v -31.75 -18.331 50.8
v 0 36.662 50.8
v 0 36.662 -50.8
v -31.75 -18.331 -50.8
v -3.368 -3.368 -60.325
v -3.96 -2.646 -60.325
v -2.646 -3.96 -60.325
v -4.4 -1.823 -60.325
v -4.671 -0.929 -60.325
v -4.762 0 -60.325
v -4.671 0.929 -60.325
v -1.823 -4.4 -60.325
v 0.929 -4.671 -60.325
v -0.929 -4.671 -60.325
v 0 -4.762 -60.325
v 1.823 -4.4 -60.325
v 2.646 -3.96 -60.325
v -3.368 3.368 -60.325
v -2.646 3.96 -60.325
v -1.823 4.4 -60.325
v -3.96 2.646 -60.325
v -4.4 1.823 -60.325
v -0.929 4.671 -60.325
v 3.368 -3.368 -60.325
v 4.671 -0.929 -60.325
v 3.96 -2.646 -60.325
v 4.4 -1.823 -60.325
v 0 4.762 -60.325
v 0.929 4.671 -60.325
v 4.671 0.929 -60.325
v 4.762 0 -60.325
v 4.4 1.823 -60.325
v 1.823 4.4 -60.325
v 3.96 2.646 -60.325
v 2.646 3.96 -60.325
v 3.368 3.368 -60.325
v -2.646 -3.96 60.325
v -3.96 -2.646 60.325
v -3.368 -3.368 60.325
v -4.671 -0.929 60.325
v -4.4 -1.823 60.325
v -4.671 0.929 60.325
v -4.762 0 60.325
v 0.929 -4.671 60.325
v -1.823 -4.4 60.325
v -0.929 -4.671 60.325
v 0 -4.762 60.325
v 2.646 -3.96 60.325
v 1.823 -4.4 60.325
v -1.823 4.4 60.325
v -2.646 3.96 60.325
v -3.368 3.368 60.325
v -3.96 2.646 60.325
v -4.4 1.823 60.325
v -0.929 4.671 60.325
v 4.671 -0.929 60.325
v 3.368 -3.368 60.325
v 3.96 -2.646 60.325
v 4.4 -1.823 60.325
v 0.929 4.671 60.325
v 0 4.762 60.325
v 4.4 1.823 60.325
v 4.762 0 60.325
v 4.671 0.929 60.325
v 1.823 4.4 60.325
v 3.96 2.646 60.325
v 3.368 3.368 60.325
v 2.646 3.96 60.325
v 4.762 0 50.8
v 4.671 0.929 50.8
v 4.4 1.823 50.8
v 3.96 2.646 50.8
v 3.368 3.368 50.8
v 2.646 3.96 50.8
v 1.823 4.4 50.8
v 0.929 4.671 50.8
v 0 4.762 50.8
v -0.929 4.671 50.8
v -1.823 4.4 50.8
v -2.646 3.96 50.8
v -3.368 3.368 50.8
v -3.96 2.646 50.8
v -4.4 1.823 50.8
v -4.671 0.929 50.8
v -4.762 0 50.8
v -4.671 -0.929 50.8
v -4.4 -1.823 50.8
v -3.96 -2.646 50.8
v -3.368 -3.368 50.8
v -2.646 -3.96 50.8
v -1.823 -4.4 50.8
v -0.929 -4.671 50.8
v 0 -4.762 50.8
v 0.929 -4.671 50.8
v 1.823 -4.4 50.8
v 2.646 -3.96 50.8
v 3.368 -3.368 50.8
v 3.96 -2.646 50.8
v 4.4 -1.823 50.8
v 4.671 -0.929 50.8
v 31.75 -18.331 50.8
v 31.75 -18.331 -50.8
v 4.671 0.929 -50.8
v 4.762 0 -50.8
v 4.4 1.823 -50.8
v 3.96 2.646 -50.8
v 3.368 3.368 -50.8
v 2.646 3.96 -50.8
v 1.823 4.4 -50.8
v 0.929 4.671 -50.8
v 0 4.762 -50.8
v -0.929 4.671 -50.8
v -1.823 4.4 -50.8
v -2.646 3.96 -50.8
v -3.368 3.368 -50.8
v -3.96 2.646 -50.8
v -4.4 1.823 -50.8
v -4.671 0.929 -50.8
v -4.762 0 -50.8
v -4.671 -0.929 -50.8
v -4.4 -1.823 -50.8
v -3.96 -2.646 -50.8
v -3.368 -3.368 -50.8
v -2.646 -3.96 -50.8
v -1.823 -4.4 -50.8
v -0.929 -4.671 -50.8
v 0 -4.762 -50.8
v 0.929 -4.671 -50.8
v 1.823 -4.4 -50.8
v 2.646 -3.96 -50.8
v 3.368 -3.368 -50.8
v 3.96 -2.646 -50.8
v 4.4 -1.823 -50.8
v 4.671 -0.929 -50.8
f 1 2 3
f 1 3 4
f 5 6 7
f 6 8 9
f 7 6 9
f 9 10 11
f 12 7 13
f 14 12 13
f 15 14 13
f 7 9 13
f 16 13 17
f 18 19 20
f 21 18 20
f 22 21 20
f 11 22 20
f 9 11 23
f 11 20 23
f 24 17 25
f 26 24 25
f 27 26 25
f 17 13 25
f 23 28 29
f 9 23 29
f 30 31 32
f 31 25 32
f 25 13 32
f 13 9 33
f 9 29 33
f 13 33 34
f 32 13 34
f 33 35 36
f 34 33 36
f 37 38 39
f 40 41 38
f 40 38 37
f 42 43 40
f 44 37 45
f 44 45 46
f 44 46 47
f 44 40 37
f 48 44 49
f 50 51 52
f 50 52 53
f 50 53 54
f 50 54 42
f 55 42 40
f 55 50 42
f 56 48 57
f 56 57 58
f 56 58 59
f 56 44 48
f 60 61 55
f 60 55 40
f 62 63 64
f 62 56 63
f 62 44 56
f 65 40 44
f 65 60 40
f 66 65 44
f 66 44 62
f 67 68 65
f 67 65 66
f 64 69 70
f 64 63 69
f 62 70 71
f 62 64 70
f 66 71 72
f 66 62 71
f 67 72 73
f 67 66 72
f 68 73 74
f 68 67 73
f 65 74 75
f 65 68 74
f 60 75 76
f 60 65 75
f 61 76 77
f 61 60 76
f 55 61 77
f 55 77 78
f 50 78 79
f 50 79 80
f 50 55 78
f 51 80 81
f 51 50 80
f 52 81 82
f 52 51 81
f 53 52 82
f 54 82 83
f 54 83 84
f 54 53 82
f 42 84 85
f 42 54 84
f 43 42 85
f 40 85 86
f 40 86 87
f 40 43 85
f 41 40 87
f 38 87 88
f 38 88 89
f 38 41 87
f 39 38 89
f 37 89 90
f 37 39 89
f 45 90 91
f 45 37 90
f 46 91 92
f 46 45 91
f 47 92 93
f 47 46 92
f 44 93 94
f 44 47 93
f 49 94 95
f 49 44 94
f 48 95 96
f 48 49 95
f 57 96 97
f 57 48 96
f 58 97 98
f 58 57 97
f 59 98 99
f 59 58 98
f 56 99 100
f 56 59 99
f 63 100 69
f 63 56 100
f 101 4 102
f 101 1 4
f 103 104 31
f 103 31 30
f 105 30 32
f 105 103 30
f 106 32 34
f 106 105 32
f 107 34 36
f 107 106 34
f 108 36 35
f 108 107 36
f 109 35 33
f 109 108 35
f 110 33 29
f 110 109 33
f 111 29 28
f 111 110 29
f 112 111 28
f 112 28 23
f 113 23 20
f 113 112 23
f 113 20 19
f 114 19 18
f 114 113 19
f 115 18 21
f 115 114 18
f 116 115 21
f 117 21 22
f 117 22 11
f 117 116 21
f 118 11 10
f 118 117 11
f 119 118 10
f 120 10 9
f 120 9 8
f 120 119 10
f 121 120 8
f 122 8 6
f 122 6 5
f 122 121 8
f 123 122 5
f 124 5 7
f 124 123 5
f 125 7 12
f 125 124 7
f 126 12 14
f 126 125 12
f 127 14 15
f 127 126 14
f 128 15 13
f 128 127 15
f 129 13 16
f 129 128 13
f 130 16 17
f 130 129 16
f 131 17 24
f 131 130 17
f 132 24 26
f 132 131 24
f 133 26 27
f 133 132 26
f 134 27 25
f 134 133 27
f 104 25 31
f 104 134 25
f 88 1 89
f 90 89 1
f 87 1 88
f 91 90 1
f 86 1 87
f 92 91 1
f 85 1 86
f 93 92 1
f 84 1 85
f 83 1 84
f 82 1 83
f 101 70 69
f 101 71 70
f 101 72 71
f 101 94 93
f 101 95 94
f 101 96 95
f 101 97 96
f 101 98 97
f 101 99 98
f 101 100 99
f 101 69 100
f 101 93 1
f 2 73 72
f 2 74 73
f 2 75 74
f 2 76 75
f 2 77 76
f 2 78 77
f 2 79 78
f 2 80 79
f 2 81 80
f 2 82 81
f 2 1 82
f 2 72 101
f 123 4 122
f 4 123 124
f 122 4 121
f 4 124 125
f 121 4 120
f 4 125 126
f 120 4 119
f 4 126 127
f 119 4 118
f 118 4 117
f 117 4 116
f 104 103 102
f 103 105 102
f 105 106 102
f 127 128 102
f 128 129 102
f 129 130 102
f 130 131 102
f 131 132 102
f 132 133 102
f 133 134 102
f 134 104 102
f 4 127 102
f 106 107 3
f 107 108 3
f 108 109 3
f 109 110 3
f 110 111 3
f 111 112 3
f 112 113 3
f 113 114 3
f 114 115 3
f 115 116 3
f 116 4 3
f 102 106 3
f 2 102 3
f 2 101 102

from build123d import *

# Parameters (mm, degrees)
F1_DEPTH = 50.8
F2_R     = 4.7625
F3_DEPTH = 60.325


with BuildPart() as f1:
    # F0 (on Top) → F1 (new body, symmetric)
    with BuildSketch(Plane.XY):
        Polygon((31.75, -18.330871), (0, 36.661742), (-31.75, -18.330871), align=None)
    extrude(amount=F1_DEPTH, both=True)

    # F2 (on Top) → F3 (join, symmetric)
    with BuildSketch(Plane.XY):
        Circle(F2_R)
    extrude(amount=F3_DEPTH, both=True)


solid = f1.part
